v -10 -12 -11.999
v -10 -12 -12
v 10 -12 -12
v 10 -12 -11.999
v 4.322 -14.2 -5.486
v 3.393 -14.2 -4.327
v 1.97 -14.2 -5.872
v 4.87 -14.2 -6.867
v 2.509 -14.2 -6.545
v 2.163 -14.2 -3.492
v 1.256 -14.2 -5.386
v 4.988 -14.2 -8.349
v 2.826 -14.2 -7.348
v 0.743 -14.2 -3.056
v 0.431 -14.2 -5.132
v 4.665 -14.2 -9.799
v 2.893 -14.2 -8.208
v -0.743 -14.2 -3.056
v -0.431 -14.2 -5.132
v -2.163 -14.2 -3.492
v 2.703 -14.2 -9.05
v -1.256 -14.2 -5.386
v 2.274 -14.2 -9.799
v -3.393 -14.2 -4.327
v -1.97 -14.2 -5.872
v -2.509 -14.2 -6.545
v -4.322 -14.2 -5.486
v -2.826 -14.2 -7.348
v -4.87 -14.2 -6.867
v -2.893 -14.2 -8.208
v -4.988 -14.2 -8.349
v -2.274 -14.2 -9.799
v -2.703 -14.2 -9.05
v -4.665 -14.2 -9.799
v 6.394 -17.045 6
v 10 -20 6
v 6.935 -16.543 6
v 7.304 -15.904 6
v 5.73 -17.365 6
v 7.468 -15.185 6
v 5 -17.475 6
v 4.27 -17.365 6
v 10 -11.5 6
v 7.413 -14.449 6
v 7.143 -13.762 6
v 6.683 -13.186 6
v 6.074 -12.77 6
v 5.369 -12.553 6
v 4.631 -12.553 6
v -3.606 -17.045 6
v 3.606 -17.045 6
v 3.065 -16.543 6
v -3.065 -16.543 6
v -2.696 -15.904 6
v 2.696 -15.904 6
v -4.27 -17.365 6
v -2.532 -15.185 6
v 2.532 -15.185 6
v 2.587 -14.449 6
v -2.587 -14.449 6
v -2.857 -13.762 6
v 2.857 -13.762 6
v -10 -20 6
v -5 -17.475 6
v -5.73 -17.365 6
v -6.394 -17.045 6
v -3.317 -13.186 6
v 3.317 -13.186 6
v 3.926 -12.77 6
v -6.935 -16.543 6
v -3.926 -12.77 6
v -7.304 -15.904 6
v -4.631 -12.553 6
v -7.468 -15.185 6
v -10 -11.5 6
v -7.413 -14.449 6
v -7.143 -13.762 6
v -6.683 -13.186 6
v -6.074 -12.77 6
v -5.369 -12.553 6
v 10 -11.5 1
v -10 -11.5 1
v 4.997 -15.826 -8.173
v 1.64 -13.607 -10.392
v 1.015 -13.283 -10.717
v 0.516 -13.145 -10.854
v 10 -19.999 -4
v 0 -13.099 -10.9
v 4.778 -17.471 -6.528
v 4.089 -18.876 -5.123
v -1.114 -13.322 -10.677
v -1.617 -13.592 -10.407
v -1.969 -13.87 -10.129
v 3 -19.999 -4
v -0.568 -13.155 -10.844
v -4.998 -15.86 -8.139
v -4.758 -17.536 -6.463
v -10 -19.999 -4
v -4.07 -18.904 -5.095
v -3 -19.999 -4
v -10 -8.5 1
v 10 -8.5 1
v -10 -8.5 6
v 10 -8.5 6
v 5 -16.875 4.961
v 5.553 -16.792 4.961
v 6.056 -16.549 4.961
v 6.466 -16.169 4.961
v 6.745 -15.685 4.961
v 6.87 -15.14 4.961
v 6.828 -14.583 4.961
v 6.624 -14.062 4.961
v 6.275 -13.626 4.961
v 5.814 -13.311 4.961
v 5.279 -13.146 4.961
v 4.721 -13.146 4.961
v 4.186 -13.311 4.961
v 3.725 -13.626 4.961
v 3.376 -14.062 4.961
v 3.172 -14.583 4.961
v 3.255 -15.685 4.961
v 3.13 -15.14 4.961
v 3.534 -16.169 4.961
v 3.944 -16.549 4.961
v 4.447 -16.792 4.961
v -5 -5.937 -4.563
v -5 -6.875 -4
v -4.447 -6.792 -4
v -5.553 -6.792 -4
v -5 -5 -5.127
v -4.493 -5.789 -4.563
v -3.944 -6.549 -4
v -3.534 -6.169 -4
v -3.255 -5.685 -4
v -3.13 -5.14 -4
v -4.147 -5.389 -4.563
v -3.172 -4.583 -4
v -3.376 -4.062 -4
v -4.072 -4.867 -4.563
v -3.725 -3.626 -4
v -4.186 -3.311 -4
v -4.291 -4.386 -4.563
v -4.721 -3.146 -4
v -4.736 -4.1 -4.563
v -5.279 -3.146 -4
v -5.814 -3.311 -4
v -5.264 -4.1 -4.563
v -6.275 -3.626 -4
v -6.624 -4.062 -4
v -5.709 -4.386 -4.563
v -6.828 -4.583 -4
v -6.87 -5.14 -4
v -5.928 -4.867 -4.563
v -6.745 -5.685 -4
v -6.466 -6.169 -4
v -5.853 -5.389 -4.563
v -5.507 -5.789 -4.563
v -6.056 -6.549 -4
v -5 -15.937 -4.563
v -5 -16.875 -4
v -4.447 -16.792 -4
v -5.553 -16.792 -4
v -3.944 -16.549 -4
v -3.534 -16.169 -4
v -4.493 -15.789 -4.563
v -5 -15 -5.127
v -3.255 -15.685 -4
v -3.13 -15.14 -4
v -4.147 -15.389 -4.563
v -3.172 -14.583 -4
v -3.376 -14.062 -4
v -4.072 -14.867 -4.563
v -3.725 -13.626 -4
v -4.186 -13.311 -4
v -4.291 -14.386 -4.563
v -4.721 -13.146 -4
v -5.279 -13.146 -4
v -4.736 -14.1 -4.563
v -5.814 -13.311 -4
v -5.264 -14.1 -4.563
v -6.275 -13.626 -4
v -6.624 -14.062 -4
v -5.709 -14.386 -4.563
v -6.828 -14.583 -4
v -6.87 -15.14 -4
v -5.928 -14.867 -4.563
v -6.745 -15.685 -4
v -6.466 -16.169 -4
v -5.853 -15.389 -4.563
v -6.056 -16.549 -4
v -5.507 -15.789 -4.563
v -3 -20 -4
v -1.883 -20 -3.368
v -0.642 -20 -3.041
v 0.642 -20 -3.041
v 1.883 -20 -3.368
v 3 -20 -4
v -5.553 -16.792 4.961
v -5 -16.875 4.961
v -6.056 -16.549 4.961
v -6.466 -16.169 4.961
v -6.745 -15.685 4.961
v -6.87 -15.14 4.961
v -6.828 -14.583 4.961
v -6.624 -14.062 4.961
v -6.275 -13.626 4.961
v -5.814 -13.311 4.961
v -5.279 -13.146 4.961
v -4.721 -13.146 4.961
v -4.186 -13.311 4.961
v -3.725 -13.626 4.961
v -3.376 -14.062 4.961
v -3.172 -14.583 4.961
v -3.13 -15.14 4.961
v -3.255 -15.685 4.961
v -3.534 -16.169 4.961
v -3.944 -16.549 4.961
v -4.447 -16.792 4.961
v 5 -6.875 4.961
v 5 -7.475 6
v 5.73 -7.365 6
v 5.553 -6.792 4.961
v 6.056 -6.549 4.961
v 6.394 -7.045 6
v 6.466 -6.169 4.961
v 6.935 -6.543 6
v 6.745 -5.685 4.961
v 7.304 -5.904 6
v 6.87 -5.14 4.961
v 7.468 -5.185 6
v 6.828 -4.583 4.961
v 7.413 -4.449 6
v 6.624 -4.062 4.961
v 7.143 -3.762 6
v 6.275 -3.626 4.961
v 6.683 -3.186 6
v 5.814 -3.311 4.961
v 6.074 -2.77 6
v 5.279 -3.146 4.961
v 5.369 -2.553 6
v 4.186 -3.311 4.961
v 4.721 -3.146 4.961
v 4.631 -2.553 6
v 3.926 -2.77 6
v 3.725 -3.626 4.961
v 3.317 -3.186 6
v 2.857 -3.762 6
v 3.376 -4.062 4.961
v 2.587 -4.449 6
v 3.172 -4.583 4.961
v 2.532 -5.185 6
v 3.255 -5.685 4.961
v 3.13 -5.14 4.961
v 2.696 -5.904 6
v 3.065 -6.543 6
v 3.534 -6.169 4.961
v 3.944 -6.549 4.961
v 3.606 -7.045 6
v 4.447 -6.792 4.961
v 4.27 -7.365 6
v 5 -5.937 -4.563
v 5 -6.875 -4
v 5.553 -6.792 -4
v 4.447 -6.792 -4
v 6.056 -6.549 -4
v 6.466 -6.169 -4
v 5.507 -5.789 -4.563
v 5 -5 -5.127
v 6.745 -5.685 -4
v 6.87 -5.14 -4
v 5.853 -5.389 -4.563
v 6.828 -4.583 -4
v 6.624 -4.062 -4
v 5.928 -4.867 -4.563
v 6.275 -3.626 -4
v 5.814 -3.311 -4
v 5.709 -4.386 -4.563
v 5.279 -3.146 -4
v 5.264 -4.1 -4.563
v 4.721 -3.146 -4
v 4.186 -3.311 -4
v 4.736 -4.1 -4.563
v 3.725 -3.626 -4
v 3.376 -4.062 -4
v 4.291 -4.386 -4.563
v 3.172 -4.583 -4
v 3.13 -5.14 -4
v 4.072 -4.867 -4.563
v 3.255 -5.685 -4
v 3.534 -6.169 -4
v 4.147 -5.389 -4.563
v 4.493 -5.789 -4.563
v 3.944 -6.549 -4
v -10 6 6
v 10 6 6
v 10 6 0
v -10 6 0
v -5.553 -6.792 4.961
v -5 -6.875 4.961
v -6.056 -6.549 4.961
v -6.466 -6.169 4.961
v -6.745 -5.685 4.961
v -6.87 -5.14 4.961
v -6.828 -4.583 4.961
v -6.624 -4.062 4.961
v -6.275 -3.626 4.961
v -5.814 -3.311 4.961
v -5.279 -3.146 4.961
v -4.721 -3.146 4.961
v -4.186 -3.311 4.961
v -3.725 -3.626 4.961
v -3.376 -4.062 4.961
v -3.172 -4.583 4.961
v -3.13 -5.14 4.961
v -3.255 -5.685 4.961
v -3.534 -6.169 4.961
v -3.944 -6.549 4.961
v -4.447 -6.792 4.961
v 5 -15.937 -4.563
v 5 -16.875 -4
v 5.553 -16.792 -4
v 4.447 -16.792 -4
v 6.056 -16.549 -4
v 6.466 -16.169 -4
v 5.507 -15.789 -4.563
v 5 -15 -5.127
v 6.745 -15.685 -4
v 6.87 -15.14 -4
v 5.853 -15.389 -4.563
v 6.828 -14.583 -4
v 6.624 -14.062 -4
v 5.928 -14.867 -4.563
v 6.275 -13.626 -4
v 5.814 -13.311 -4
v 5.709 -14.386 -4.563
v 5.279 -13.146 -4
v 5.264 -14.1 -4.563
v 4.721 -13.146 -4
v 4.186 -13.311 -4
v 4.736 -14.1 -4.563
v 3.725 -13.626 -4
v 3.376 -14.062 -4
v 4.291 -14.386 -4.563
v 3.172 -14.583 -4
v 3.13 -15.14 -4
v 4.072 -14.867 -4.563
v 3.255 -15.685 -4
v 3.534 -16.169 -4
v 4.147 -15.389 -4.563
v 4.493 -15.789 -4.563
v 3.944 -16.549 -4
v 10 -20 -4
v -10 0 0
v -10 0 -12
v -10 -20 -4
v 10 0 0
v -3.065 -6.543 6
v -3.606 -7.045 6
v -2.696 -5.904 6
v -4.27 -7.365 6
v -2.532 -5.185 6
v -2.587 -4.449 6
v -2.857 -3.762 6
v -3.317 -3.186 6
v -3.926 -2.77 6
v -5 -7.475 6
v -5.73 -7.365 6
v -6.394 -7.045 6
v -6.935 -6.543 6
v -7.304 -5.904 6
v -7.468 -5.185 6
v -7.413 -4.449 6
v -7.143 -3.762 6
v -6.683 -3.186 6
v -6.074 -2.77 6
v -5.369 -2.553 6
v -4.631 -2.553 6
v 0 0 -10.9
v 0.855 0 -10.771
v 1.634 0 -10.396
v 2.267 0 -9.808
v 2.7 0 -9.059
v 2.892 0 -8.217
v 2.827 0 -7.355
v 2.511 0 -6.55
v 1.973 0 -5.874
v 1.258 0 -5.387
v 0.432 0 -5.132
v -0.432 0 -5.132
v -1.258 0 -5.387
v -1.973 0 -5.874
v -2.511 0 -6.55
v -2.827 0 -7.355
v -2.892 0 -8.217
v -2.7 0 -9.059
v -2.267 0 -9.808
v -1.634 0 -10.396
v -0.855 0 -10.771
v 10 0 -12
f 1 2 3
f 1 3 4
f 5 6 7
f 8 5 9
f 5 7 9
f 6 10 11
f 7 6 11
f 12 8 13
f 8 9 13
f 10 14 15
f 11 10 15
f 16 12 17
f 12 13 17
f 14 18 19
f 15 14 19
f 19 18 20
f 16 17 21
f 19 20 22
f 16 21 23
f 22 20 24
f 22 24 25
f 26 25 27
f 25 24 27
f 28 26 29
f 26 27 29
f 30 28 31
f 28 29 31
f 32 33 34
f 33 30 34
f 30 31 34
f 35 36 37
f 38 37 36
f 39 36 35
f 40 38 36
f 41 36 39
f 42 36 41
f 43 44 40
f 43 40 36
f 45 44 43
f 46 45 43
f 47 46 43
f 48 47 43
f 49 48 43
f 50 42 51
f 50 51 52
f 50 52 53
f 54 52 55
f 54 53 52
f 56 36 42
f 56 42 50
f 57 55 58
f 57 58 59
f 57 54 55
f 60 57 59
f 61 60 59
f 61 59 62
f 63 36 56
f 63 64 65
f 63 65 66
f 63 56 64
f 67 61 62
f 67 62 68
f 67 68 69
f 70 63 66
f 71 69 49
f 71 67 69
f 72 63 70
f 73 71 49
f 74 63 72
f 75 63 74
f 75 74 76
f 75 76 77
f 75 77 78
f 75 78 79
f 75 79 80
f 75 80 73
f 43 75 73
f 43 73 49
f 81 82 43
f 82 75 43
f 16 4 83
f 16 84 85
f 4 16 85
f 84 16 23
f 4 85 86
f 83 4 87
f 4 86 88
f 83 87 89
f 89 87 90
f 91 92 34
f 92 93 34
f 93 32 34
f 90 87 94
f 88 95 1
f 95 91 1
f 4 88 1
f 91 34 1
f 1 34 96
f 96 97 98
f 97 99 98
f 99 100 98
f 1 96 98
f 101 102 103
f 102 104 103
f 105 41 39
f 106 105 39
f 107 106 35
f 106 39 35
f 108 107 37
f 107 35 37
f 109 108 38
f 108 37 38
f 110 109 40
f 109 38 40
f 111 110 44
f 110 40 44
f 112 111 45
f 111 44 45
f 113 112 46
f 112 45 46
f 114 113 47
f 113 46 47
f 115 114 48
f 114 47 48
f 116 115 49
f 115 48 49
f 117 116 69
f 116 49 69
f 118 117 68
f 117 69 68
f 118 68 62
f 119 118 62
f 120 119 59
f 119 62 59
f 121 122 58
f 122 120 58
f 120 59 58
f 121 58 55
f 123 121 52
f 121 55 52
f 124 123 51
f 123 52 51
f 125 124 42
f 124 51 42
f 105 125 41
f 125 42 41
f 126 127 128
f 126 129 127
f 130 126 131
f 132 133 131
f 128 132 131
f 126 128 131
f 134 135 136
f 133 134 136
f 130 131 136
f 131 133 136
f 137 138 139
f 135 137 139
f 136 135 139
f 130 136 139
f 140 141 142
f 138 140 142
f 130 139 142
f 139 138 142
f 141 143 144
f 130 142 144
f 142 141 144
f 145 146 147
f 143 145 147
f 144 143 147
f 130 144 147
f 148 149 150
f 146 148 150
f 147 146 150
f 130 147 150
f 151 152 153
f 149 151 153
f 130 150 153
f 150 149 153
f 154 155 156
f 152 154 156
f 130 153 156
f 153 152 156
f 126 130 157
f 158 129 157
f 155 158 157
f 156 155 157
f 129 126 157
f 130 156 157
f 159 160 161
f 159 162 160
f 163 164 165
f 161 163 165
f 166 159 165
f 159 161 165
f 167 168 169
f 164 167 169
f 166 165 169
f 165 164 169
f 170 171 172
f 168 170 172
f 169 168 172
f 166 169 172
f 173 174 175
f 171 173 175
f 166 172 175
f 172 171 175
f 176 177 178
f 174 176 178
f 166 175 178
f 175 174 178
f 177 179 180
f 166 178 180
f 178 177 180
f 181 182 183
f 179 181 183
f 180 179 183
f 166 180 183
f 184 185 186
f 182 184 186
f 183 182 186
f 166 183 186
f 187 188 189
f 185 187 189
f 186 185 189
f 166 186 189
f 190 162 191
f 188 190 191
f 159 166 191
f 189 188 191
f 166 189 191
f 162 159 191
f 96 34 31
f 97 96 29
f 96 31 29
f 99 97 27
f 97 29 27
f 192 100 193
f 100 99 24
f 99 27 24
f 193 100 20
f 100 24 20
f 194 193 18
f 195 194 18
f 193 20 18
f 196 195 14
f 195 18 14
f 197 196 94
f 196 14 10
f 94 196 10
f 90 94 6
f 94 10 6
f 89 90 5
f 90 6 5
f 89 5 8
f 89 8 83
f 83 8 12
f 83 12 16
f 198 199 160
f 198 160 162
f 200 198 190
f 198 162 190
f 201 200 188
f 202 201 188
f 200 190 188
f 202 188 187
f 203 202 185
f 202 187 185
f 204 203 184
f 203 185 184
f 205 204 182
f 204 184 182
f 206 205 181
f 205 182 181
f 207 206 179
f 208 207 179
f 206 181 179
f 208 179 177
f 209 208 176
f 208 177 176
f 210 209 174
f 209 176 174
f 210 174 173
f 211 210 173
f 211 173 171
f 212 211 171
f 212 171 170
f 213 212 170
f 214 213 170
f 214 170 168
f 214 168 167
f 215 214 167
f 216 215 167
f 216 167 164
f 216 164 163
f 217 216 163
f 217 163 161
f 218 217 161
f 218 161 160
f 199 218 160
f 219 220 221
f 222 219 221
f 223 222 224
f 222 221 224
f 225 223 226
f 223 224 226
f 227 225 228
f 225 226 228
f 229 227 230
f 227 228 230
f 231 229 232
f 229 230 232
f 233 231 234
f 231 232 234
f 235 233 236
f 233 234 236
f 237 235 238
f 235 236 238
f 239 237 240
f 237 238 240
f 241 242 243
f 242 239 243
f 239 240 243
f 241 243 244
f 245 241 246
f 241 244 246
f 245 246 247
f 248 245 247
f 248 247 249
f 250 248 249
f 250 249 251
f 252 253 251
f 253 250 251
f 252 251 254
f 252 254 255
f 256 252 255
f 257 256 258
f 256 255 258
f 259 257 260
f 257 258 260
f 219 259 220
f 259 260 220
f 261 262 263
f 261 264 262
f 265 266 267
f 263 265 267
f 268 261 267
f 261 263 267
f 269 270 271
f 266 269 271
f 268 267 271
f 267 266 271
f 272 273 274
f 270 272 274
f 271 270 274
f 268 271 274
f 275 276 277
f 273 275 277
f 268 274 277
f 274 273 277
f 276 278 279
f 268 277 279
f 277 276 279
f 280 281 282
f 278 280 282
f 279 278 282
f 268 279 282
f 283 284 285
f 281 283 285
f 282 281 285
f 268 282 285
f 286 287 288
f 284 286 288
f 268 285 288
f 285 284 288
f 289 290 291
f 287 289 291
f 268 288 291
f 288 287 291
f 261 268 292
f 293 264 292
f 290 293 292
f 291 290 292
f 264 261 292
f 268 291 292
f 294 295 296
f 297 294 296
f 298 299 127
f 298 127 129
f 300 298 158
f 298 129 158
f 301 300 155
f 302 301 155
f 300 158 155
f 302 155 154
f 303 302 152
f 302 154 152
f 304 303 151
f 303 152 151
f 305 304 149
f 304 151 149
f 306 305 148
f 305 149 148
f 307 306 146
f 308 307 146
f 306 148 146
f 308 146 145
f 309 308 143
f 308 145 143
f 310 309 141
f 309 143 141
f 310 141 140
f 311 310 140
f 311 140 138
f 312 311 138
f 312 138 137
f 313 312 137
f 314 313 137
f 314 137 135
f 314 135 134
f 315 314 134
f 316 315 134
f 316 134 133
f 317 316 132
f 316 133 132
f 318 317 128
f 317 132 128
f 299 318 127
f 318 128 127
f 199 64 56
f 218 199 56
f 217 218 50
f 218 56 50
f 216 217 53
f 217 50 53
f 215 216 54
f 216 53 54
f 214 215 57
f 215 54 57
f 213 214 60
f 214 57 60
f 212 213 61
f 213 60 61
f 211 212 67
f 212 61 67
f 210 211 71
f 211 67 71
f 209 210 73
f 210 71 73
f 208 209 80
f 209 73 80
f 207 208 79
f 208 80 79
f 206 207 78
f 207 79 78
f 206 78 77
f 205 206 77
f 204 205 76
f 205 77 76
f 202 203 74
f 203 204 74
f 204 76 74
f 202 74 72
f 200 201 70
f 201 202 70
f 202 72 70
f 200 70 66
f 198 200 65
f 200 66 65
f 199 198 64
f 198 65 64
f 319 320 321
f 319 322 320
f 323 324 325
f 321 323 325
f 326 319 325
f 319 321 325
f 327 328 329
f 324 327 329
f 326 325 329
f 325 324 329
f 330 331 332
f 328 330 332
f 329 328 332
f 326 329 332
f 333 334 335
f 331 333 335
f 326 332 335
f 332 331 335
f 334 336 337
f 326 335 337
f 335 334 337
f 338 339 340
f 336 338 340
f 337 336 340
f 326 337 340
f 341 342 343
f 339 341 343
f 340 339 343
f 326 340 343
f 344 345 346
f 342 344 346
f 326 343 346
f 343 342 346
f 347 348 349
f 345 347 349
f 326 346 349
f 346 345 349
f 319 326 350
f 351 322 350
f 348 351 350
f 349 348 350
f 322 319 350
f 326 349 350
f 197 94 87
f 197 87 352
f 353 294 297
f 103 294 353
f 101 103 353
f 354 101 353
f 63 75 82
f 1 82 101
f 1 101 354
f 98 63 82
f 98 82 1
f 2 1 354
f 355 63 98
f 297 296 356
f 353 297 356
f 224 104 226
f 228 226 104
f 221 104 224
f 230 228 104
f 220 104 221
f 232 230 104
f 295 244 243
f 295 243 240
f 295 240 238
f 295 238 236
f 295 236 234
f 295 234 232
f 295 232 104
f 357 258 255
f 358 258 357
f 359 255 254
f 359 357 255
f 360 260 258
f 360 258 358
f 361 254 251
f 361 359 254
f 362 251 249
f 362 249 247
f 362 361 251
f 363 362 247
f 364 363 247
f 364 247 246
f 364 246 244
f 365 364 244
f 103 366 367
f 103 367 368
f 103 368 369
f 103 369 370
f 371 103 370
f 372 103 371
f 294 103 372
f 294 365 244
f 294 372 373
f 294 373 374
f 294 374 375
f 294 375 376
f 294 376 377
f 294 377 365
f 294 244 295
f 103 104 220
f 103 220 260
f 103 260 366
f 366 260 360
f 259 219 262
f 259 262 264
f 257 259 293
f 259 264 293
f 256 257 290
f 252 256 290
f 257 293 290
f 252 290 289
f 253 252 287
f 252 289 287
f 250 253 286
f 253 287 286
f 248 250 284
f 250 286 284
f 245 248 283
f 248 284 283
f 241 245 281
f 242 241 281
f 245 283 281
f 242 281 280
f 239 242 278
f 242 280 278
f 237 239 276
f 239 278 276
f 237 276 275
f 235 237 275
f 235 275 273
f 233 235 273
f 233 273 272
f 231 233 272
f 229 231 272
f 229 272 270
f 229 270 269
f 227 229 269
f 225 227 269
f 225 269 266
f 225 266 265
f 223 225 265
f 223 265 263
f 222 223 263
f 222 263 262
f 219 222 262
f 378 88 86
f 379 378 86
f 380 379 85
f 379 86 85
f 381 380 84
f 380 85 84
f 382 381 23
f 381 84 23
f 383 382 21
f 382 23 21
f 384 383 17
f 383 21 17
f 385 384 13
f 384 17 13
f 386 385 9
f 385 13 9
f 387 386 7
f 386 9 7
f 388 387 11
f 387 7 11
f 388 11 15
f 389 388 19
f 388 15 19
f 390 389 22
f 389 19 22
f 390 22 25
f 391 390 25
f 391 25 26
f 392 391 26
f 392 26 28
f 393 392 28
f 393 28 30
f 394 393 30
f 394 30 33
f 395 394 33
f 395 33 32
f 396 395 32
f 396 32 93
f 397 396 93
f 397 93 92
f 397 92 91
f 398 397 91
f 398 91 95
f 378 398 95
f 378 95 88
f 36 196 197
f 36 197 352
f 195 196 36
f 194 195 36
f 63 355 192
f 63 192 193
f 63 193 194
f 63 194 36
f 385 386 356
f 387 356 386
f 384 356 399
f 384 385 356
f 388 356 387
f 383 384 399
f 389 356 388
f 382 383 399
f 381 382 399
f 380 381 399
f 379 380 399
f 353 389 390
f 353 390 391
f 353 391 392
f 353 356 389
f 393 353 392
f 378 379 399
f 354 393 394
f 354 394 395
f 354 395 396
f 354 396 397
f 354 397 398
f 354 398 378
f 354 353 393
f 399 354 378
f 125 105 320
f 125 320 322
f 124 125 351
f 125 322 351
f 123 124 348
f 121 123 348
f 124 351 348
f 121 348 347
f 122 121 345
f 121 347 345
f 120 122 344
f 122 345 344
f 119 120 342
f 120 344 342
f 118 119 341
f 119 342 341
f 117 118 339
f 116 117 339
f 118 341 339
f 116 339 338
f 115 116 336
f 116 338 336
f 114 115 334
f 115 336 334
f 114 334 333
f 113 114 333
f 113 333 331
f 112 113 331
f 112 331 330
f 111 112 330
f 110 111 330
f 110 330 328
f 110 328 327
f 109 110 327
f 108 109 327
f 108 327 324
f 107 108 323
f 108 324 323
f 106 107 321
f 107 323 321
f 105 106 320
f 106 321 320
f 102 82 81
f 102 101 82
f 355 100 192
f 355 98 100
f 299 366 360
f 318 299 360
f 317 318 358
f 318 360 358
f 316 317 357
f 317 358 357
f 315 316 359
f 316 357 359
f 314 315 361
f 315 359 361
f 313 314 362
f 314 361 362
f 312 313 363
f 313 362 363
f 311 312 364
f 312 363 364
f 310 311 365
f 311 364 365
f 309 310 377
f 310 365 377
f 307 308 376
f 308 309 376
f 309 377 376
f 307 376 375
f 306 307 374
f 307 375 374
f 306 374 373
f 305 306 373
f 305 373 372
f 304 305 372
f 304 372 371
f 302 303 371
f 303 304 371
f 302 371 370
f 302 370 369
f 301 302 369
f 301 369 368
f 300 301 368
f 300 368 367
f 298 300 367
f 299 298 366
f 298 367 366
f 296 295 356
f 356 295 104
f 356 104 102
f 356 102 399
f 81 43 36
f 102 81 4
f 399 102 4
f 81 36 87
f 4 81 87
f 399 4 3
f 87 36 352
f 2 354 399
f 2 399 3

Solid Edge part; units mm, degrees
sketch "Sketch1" plane through (0, 0, 0) normal (1, 0, 0) x (0, 1, 0)
  line L0 (0, 0) -> (0, -12)
  line L1 (0, -12) -> (-12, -12)
  line L2 (-12, -12) -> (-12, -4)
  line L3 (-12, -4) -> (-20, -4)
  line L4 (-20, -4) -> (-20, 6)
  line L5 (-20, 6) -> (6, 6)
  line L6 (6, 6) -> (6, 0)
  line L7 (6, 0) -> (0, 0)
  dimension "D1" = 6
  dimension "D2" = 12
  dimension "D3" = 12
  dimension "D4" = 6
  dimension "D5" = 8
  dimension "D6" = 8
extrude "Protrusion1" add sketch "Sketch1" along normal mid plane 20
chamfer "Chamfer_1" distance 8 angle 45 1 edges at (0, -12, -4)
hole "Hole_1" at (0, -20, -8) direction (0, 1, 0) diameter 5.8 end up to next counterbore diameter 10 counterbore depth 5.8
hole "Hole_2" at (-5, -15, 6) direction (0, 0, -1) diameter 3.75 depth 10 tip angle 118 start chamfer 0.6 start chamfer angle 30 end chamfer 0.6 end chamfer angle 30
pattern_linear "Pattern1" count 2 spacing 10 along (1, 0, 0) count 2 spacing 10 along (0, 1, 0) of "Hole_2"
sketch "Sketch2" plane through (0, -7, 6) normal (0, 0, 1) x (-1, 0, 0)
  line L0 (-10, 1.5) -> (10, 1.5)
  line L1 (10, 1.5) -> (10, 4.5)
  line L2 (10, 4.5) -> (-10, 4.5)
  line L3 (-10, 4.5) -> (-10, 1.5)
  dimension "D1" = 3.5
  dimension "D2" = 3.5
extrude "ExtrudedCutout_1" cut sketch "Sketch2" against normal blind 5
properties material "Polyethylene, low density"
